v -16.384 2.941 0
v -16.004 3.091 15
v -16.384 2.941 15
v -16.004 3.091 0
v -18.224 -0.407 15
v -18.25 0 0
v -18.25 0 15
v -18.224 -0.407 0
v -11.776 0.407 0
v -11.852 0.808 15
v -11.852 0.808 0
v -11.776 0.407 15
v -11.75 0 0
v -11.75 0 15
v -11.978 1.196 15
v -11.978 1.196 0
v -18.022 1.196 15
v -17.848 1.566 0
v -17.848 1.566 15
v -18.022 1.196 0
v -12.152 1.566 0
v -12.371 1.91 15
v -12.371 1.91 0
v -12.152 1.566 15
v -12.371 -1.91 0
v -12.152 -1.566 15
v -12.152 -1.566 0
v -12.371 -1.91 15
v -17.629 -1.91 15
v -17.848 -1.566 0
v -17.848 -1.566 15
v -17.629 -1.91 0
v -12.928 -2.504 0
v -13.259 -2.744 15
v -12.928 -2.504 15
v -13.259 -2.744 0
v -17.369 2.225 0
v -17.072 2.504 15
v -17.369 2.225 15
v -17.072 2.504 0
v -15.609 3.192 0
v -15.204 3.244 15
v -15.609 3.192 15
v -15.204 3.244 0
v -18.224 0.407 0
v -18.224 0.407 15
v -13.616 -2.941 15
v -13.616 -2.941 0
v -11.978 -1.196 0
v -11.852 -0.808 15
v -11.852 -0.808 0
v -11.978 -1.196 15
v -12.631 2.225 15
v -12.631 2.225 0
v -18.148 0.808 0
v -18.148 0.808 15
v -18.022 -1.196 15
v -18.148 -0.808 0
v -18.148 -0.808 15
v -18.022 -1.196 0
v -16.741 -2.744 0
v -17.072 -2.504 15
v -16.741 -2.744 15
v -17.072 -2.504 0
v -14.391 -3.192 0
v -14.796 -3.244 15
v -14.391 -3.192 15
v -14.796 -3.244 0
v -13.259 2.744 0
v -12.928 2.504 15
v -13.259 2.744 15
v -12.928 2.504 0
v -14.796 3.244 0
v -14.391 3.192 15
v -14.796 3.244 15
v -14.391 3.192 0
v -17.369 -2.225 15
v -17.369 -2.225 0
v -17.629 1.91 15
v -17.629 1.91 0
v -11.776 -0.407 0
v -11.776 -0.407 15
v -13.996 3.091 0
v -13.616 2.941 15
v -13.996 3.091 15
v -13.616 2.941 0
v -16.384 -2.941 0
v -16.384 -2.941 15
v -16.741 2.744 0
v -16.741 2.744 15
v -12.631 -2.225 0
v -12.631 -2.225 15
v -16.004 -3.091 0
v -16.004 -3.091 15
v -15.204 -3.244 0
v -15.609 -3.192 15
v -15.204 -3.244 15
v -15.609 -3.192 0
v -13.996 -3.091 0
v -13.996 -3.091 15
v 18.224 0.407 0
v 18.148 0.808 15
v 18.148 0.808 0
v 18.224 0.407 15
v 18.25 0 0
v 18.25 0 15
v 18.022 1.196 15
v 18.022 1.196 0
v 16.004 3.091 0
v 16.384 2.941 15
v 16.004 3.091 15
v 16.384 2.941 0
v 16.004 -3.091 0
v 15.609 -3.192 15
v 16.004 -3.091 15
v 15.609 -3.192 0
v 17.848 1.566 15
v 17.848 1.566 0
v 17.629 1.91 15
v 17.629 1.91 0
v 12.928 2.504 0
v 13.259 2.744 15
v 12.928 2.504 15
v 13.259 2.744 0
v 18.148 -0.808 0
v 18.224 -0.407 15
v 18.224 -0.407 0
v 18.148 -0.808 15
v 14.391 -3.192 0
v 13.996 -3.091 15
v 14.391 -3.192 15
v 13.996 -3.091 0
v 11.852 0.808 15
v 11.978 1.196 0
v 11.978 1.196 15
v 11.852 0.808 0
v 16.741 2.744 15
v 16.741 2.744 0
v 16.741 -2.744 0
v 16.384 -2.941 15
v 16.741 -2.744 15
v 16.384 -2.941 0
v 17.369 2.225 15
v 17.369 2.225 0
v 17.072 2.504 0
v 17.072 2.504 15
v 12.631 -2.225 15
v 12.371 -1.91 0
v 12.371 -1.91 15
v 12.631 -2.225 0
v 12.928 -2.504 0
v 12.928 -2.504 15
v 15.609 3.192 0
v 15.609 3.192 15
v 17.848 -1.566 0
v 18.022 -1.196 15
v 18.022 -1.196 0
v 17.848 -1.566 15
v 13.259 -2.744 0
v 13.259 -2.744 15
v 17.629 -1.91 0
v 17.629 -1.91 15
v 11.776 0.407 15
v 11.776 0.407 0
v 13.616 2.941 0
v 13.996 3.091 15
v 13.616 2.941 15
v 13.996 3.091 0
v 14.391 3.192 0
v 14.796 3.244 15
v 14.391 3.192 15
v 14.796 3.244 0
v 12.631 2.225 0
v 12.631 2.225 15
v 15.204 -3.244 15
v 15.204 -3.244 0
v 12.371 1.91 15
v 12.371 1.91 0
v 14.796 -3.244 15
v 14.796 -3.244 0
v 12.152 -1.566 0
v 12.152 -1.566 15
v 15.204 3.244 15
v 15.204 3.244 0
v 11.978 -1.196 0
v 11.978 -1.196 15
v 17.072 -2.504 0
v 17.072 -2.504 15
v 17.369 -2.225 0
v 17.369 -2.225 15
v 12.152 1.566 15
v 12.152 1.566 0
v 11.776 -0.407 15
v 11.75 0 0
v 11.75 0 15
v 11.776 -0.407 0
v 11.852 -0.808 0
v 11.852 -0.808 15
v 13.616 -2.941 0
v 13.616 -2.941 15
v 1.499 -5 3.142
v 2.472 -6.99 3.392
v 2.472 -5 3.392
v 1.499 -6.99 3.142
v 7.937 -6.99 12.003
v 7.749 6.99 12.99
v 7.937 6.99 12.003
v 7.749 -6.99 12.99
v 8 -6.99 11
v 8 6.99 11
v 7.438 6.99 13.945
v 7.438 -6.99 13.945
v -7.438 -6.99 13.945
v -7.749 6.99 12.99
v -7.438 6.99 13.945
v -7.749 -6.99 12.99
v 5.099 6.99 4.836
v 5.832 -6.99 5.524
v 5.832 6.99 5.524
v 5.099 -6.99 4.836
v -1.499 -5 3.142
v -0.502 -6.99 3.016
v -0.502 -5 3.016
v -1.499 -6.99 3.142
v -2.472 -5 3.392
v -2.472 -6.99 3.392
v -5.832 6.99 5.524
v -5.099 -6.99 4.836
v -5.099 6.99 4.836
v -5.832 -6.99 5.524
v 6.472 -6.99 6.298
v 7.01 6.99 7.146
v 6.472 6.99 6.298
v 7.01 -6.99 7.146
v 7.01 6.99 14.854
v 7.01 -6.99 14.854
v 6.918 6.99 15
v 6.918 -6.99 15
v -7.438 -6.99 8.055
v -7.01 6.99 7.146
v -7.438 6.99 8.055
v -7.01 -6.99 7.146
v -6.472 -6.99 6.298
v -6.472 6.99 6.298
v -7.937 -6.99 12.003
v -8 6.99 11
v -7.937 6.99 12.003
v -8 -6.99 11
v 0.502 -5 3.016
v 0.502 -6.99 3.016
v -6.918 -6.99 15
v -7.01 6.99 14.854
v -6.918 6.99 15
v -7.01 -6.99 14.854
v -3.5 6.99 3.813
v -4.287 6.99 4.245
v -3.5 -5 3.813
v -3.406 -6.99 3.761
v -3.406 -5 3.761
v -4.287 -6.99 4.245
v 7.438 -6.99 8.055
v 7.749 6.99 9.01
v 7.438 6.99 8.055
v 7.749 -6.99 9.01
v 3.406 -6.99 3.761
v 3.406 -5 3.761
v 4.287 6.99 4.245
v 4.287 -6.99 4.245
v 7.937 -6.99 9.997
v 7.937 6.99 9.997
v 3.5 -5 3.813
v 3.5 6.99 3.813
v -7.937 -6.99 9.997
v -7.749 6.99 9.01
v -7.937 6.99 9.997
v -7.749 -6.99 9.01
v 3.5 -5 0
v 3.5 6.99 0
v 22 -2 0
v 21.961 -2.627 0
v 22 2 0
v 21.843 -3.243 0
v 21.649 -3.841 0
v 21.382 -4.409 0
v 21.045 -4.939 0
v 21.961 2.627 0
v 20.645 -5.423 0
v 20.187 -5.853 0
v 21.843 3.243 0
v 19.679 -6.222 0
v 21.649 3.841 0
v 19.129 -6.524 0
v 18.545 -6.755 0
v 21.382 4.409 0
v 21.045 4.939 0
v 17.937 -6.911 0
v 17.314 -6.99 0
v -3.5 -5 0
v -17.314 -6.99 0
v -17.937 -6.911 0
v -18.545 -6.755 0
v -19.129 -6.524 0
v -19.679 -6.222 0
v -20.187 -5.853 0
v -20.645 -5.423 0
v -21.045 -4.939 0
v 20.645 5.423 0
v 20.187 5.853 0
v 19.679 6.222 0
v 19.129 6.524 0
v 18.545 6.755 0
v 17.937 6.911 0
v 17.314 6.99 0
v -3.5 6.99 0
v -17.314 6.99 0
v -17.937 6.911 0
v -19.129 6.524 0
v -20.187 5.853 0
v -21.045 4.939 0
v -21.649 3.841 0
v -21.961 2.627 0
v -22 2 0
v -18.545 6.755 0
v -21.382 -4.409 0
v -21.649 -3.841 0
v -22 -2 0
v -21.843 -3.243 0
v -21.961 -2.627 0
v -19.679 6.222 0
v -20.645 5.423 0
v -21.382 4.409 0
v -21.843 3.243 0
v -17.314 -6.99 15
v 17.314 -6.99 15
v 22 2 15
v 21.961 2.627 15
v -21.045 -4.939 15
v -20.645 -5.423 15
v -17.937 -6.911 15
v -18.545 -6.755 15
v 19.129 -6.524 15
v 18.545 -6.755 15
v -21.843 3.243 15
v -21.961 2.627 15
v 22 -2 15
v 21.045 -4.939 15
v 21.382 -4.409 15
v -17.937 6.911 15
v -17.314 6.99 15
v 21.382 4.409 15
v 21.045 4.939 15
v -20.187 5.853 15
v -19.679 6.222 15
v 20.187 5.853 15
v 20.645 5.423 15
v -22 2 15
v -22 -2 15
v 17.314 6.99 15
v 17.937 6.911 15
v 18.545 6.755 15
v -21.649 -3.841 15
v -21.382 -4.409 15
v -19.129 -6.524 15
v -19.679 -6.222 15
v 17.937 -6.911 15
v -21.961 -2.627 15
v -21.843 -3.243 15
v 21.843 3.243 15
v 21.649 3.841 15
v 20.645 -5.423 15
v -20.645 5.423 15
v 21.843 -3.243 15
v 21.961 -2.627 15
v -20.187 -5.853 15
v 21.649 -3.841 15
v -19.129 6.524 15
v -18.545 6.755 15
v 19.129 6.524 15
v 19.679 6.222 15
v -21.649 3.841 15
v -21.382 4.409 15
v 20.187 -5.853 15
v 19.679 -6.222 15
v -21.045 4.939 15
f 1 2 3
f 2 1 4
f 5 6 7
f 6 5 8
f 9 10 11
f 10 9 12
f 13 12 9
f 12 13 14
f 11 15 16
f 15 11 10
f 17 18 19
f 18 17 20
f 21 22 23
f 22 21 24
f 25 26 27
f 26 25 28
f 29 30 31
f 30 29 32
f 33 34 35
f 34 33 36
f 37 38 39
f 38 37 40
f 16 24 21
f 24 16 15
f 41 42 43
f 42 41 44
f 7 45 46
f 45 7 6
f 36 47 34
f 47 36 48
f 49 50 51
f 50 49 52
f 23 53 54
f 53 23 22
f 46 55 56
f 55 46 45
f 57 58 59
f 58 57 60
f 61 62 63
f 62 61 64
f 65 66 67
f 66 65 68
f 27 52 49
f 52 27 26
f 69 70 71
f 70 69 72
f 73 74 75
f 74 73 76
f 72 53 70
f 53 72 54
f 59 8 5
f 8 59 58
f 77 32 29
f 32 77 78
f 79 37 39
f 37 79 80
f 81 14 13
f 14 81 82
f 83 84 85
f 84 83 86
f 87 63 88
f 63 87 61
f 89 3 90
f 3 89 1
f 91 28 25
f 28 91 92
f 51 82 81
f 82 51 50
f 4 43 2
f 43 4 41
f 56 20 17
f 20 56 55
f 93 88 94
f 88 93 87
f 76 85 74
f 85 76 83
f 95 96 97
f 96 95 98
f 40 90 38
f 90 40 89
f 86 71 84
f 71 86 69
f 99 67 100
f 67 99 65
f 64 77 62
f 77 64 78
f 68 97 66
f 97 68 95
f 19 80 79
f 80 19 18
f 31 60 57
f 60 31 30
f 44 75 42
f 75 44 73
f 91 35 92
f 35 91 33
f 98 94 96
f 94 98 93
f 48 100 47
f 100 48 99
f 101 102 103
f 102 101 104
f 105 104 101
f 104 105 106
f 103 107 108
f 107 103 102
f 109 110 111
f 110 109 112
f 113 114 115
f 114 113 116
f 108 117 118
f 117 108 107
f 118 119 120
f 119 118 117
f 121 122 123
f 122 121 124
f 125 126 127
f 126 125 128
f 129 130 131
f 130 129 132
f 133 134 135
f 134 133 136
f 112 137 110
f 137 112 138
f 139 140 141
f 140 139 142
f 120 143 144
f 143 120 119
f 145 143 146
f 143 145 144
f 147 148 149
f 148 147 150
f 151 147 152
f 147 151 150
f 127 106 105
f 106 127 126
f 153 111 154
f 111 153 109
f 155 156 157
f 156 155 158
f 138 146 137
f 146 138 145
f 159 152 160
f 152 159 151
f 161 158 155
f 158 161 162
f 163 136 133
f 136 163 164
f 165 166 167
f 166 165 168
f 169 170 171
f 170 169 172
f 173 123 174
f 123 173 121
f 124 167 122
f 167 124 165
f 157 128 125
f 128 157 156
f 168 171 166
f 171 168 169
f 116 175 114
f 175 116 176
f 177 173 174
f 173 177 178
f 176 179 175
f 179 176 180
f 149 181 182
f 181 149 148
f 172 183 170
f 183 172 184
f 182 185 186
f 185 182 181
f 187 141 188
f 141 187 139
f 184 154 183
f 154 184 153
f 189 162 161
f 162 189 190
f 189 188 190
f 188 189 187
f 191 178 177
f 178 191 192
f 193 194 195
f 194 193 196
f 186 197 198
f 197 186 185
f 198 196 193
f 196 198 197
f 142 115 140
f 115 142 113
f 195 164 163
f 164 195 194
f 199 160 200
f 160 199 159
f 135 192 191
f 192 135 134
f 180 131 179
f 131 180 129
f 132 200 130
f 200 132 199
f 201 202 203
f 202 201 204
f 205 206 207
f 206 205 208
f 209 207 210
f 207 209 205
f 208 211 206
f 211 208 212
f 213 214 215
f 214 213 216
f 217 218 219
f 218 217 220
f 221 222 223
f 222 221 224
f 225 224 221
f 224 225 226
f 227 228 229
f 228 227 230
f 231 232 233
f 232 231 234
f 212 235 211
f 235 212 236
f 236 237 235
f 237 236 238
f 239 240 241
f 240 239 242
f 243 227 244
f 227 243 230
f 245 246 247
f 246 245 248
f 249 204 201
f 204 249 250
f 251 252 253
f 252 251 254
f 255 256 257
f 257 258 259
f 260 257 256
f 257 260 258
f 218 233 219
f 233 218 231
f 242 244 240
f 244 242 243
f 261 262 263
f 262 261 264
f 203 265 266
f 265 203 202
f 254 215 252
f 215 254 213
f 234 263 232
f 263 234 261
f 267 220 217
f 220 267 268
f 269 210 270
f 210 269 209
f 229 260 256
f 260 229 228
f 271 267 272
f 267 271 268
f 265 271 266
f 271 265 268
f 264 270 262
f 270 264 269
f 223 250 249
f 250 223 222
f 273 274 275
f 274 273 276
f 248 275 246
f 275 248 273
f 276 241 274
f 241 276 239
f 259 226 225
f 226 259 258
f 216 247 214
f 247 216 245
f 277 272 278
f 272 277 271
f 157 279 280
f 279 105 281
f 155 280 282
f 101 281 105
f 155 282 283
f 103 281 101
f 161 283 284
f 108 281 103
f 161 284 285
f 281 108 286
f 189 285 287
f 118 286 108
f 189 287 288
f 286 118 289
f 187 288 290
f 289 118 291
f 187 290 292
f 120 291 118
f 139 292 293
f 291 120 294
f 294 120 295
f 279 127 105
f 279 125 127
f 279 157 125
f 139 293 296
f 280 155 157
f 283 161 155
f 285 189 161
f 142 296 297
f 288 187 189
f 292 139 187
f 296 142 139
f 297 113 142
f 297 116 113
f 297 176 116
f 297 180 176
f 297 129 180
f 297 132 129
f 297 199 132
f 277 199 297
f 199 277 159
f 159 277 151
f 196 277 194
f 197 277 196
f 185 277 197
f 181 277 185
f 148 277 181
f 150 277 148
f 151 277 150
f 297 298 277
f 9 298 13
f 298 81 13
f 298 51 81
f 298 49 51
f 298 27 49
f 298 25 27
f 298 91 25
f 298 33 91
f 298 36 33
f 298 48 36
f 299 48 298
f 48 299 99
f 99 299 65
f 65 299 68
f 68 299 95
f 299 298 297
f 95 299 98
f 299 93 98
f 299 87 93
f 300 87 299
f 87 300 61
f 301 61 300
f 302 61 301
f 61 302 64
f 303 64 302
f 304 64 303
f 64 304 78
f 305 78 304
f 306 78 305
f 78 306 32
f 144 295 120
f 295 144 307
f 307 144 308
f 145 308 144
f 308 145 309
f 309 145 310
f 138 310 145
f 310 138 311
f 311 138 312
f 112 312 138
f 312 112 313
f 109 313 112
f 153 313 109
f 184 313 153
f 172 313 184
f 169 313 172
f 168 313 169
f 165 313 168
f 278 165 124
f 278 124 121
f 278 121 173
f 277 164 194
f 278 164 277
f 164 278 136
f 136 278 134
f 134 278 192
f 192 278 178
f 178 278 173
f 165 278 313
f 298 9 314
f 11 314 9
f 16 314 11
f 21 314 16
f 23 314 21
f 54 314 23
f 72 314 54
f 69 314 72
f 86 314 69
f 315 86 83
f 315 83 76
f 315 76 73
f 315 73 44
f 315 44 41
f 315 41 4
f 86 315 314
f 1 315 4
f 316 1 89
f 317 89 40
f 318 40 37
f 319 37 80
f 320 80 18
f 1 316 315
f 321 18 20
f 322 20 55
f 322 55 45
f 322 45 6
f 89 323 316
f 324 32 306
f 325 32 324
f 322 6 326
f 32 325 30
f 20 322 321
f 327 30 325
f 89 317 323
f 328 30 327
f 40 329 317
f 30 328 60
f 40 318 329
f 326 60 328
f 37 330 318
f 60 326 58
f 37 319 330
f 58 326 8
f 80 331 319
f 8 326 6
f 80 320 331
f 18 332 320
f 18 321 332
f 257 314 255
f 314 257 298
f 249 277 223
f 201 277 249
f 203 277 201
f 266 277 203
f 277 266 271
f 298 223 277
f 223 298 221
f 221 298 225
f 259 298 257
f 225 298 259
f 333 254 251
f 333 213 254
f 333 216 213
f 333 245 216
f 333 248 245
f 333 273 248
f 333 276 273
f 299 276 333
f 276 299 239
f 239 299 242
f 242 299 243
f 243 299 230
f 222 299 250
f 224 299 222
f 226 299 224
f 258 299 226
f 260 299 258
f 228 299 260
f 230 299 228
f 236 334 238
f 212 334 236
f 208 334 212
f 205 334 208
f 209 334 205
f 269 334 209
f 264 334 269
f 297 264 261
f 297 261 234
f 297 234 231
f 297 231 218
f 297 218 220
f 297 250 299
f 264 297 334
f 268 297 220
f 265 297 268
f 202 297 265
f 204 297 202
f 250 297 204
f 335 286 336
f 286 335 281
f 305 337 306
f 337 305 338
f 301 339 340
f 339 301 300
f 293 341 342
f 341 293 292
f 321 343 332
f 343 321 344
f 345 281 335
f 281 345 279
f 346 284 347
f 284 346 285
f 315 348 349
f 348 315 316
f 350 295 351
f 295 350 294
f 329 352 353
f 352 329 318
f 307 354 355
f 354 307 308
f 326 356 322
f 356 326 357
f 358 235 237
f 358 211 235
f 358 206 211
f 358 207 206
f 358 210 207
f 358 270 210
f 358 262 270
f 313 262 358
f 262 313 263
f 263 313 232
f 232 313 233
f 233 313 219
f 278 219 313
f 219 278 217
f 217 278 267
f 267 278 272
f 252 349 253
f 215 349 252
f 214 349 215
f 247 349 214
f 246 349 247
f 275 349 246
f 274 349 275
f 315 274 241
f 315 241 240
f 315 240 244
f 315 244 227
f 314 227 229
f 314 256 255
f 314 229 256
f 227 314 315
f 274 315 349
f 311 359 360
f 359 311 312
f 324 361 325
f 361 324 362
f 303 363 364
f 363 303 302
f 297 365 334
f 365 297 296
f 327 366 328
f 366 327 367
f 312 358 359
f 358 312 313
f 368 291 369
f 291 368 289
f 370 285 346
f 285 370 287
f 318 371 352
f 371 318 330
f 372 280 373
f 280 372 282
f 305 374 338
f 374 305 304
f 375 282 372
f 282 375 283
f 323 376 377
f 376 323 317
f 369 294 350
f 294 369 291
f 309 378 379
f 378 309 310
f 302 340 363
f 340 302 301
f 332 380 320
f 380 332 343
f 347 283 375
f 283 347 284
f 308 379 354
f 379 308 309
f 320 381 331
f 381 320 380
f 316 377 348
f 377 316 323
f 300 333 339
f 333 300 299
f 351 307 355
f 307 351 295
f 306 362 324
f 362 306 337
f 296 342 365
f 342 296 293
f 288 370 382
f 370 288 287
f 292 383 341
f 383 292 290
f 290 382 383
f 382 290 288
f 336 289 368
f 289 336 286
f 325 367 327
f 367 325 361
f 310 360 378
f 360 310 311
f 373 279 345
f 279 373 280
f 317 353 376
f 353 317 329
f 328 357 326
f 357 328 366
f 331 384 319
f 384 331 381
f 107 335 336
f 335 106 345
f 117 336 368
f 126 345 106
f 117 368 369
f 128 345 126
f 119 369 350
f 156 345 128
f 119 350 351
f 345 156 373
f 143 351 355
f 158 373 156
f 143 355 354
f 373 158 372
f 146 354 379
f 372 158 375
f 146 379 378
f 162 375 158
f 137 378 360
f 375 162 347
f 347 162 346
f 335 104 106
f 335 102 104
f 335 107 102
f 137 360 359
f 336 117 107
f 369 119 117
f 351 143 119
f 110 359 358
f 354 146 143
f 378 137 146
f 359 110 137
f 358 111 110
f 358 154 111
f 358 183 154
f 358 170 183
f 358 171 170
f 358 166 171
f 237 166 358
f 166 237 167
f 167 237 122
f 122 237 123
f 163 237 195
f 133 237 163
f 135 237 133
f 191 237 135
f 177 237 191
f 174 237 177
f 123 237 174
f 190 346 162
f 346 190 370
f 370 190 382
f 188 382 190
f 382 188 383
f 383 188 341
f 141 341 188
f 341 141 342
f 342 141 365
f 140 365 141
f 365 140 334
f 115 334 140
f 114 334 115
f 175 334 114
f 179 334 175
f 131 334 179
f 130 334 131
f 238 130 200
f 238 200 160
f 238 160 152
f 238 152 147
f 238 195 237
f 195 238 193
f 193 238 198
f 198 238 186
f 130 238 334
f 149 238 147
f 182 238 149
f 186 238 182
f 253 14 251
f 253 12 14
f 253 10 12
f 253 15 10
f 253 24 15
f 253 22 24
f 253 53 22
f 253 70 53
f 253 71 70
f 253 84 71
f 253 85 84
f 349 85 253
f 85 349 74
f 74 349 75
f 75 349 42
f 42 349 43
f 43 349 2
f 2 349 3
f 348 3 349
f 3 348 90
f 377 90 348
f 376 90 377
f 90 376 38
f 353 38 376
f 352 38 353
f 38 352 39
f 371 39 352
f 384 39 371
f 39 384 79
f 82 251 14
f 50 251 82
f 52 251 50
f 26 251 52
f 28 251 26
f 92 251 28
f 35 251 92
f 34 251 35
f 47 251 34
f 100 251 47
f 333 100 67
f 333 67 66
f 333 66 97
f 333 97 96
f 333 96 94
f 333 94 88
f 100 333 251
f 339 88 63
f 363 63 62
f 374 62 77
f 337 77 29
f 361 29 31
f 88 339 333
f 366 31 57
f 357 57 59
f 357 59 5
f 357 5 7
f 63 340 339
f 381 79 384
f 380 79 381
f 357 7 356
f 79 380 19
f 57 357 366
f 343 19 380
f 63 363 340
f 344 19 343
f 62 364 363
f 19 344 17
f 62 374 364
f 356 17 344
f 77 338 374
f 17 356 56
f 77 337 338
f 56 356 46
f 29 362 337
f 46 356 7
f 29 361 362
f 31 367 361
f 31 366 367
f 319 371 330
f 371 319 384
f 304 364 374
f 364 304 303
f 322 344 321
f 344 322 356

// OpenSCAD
$fn = 50;


difference() {
	union() {
		hull() {
			translate(v = [-17.0000000000, 2.0000000000, 0]) {
				cylinder(h = 15, r = 5);
			}
			translate(v = [17.0000000000, 2.0000000000, 0]) {
				cylinder(h = 15, r = 5);
			}
			translate(v = [-17.0000000000, -2.0000000000, 0]) {
				cylinder(h = 15, r = 5);
			}
			translate(v = [17.0000000000, -2.0000000000, 0]) {
				cylinder(h = 15, r = 5);
			}
		}
	}
	union() {
		translate(v = [-15.0000000000, 30.0000000000, 0]) {
			rotate(a = [0, 0, 30.0000000000]) {
				difference() {
					union() {
						#translate(v = [-2.8750000000, -5.0000000000, -0.3000000000]) {
							cube(size = [5.7500000000, 10, 0.3000000000]);
						}
						#translate(v = [-2.8750000000, -2.8750000000, -0.6000000000]) {
							cube(size = [5.7500000000, 5.7500000000, 0.3000000000]);
						}
						#translate(v = [-2.8750000000, -5.0000000000, 5]) {
							cube(size = [5.7500000000, 10, 0.3000000000]);
						}
						#translate(v = [-2.8750000000, -2.8750000000, 5.3000000000]) {
							cube(size = [5.7500000000, 5.7500000000, 0.3000000000]);
						}
						#translate(v = [0, 0, -100.0000000000]) {
							cylinder(h = 200, r = 3.2500000000);
						}
						#linear_extrude(height = 5) {
							polygon(points = [[5.9142500000, 0.0000000000], [2.9571250000, 5.1218907443], [-2.9571250000, 5.1218907443], [-5.9142500000, 0.0000000000], [-2.9571250000, -5.1218907443], [2.9571250000, -5.1218907443]]);
						}
						#translate(v = [-2.8750000000, -5.0000000000, -0.3000000000]) {
							cube(size = [5.7500000000, 10, 0.3000000000]);
						}
						#translate(v = [-2.8750000000, -2.8750000000, -0.6000000000]) {
							cube(size = [5.7500000000, 5.7500000000, 0.3000000000]);
						}
						#translate(v = [-2.8750000000, -5.0000000000, 5]) {
							cube(size = [5.7500000000, 10, 0.3000000000]);
						}
						#translate(v = [-2.8750000000, -2.8750000000, 5.3000000000]) {
							cube(size = [5.7500000000, 5.7500000000, 0.3000000000]);
						}
						#translate(v = [0, 0, -100.0000000000]) {
							cylinder(h = 200, r = 3.2500000000);
						}
						#translate(v = [-2.8750000000, -5.0000000000, -0.3000000000]) {
							cube(size = [5.7500000000, 10, 0.3000000000]);
						}
						#translate(v = [-2.8750000000, -2.8750000000, -0.6000000000]) {
							cube(size = [5.7500000000, 5.7500000000, 0.3000000000]);
						}
						#translate(v = [-2.8750000000, -5.0000000000, 5]) {
							cube(size = [5.7500000000, 10, 0.3000000000]);
						}
						#translate(v = [-2.8750000000, -2.8750000000, 5.3000000000]) {
							cube(size = [5.7500000000, 5.7500000000, 0.3000000000]);
						}
						#translate(v = [0, 0, -100.0000000000]) {
							cylinder(h = 200, r = 3.2500000000);
						}
					}
					union();
				}
			}
		}
		translate(v = [15.0000000000, 30.0000000000, 0]) {
			rotate(a = [0, 0, 30.0000000000]) {
				difference() {
					union() {
						#translate(v = [-2.8750000000, -5.0000000000, -0.3000000000]) {
							cube(size = [5.7500000000, 10, 0.3000000000]);
						}
						#translate(v = [-2.8750000000, -2.8750000000, -0.6000000000]) {
							cube(size = [5.7500000000, 5.7500000000, 0.3000000000]);
						}
						#translate(v = [-2.8750000000, -5.0000000000, 5]) {
							cube(size = [5.7500000000, 10, 0.3000000000]);
						}
						#translate(v = [-2.8750000000, -2.8750000000, 5.3000000000]) {
							cube(size = [5.7500000000, 5.7500000000, 0.3000000000]);
						}
						#translate(v = [0, 0, -100.0000000000]) {
							cylinder(h = 200, r = 3.2500000000);
						}
						#linear_extrude(height = 5) {
							polygon(points = [[5.9142500000, 0.0000000000], [2.9571250000, 5.1218907443], [-2.9571250000, 5.1218907443], [-5.9142500000, 0.0000000000], [-2.9571250000, -5.1218907443], [2.9571250000, -5.1218907443]]);
						}
						#translate(v = [-2.8750000000, -5.0000000000, -0.3000000000]) {
							cube(size = [5.7500000000, 10, 0.3000000000]);
						}
						#translate(v = [-2.8750000000, -2.8750000000, -0.6000000000]) {
							cube(size = [5.7500000000, 5.7500000000, 0.3000000000]);
						}
						#translate(v = [-2.8750000000, -5.0000000000, 5]) {
							cube(size = [5.7500000000, 10, 0.3000000000]);
						}
						#translate(v = [-2.8750000000, -2.8750000000, 5.3000000000]) {
							cube(size = [5.7500000000, 5.7500000000, 0.3000000000]);
						}
						#translate(v = [0, 0, -100.0000000000]) {
							cylinder(h = 200, r = 3.2500000000);
						}
						#translate(v = [-2.8750000000, -5.0000000000, -0.3000000000]) {
							cube(size = [5.7500000000, 10, 0.3000000000]);
						}
						#translate(v = [-2.8750000000, -2.8750000000, -0.6000000000]) {
							cube(size = [5.7500000000, 5.7500000000, 0.3000000000]);
						}
						#translate(v = [-2.8750000000, -5.0000000000, 5]) {
							cube(size = [5.7500000000, 10, 0.3000000000]);
						}
						#translate(v = [-2.8750000000, -2.8750000000, 5.3000000000]) {
							cube(size = [5.7500000000, 5.7500000000, 0.3000000000]);
						}
						#translate(v = [0, 0, -100.0000000000]) {
							cylinder(h = 200, r = 3.2500000000);
						}
					}
					union();
				}
			}
		}
		translate(v = [-15.0000000000, 0.0000000000, -100.0000000000]) {
			cylinder(h = 200, r = 3.2500000000);
		}
		translate(v = [15.0000000000, 0.0000000000, -100.0000000000]) {
			cylinder(h = 200, r = 3.2500000000);
		}
		translate(v = [15.0000000000, 0.0000000000, -100.0000000000]) {
			cylinder(h = 200, r = 3.2500000000);
		}
		translate(v = [-15.0000000000, 0.0000000000, -100.0000000000]) {
			cylinder(h = 200, r = 1.8000000000);
		}
		translate(v = [15.0000000000, 0.0000000000, -100.0000000000]) {
			cylinder(h = 200, r = 1.8000000000);
		}
		translate(v = [-15.0000000000, 0.0000000000, -100.0000000000]) {
			cylinder(h = 200, r = 1.8000000000);
		}
		translate(v = [15.0000000000, 0.0000000000, -100.0000000000]) {
			cylinder(h = 200, r = 1.8000000000);
		}
		translate(v = [-15.0000000000, 0.0000000000, -100.0000000000]) {
			cylinder(h = 200, r = 1.8000000000);
		}
		translate(v = [15.0000000000, 0.0000000000, -100.0000000000]) {
			cylinder(h = 200, r = 1.8000000000);
		}
		#translate(v = [0, 26.0000000000, 11.0000000000]) {
			rotate(a = [90, 0, 0]) {
				cylinder(h = 52, r = 8.0000000000);
			}
		}
		#translate(v = [-3.5000000000, -5.0000000000, 0.0000000000]) {
			cube(size = [7, 51, 6]);
		}
	}
}
